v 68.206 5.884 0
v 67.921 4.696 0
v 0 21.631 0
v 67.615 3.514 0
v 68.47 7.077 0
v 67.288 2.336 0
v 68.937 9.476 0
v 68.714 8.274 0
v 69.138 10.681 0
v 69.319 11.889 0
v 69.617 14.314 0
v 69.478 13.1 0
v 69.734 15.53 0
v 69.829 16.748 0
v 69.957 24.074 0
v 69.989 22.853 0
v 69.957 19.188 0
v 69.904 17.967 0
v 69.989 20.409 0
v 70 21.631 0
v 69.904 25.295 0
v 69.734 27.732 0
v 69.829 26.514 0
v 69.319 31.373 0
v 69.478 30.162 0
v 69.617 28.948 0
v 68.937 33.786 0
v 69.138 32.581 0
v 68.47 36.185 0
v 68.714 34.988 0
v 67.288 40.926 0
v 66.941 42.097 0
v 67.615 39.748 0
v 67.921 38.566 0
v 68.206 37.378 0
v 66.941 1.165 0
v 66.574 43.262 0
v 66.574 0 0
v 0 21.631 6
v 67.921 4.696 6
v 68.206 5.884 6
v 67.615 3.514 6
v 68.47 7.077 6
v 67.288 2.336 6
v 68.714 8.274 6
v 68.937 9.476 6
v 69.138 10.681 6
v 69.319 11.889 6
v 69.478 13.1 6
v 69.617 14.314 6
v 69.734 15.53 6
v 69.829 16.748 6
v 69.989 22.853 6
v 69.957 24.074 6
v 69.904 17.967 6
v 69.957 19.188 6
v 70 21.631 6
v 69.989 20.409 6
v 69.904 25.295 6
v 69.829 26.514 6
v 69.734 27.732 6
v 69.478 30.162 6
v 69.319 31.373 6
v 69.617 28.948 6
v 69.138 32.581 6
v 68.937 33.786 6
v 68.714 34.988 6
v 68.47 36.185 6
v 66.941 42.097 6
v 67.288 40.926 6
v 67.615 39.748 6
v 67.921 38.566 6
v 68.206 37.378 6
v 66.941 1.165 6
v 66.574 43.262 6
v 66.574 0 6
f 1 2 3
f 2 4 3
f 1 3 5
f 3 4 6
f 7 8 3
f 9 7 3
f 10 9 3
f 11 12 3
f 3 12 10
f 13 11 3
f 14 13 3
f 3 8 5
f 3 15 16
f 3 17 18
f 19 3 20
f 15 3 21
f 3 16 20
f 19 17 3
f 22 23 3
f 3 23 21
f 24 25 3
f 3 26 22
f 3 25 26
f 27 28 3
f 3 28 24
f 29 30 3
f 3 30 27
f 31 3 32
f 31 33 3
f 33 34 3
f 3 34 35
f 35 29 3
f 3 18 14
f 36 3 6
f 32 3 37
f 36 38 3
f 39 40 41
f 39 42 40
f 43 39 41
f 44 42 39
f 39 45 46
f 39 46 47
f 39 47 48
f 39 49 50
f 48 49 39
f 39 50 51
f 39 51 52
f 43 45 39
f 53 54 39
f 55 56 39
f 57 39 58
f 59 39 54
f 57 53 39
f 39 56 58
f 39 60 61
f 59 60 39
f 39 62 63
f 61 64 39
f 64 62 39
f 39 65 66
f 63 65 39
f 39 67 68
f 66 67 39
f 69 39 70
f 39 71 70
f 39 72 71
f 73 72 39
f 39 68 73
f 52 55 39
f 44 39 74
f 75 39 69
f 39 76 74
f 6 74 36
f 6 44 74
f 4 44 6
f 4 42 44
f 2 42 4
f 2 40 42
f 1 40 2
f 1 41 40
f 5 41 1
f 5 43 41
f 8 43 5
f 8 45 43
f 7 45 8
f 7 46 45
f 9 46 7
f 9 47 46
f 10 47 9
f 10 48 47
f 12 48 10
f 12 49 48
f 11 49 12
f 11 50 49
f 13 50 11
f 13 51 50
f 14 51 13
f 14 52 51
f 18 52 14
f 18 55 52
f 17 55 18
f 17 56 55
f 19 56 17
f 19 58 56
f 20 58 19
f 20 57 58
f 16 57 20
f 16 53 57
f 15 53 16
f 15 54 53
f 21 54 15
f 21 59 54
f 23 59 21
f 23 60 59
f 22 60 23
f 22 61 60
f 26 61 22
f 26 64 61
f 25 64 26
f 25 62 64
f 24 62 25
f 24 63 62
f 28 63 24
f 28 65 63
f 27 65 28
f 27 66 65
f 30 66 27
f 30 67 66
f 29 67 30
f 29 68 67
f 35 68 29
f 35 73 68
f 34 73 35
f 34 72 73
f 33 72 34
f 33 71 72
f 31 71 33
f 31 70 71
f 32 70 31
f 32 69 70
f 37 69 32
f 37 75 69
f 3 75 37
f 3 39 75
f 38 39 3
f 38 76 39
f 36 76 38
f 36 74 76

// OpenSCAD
$fn = 32;

// ----------------------------------------------------------------------
// Arc profile plate: sector, 38 points
// ----------------------------------------------------------------------

// --- parameters (mm) ---
sector_angle = 36;        // sector angle, degrees
sector_r = 70;            // outer radius
arc_step = 1;             // sampling step of the arc, degrees
plate_t = 6;              // plate thickness, Z
fit_tol = 0.02;           // declared fit tolerance (prompt contract)
free_tol = 0.2;           // declared free tolerance (prompt contract)

bbox_x = 2 * sector_r * sin(sector_angle / 2);  // chord of the sector
bbox_y = sector_r;  // depth of the sector (apex to arc)

profile = [[66.574, 0], [66.941, 1.165], [67.288, 2.336], [67.615, 3.514], [67.921, 4.696], [68.206, 5.884], [68.47, 7.077], [68.714, 8.274], [68.937, 9.476], [69.138, 10.681], [69.319, 11.889], [69.478, 13.1], [69.617, 14.314], [69.734, 15.53], [69.829, 16.748], [69.904, 17.967], [69.957, 19.188], [69.989, 20.409], [70, 21.631], [69.989, 22.853], [69.957, 24.074], [69.904, 25.295], [69.829, 26.514], [69.734, 27.732], [69.617, 28.948], [69.478, 30.162], [69.319, 31.373], [69.138, 32.581], [68.937, 33.786], [68.714, 34.988], [68.47, 36.185], [68.206, 37.378], [67.921, 38.566], [67.615, 39.748], [67.288, 40.926], [66.941, 42.097], [66.574, 43.262], [0, 21.631]];  // primary outline, 38 points, counter clockwise

// --- the one profile operation ---
linear_extrude(height = plate_t) polygon(points = profile);
